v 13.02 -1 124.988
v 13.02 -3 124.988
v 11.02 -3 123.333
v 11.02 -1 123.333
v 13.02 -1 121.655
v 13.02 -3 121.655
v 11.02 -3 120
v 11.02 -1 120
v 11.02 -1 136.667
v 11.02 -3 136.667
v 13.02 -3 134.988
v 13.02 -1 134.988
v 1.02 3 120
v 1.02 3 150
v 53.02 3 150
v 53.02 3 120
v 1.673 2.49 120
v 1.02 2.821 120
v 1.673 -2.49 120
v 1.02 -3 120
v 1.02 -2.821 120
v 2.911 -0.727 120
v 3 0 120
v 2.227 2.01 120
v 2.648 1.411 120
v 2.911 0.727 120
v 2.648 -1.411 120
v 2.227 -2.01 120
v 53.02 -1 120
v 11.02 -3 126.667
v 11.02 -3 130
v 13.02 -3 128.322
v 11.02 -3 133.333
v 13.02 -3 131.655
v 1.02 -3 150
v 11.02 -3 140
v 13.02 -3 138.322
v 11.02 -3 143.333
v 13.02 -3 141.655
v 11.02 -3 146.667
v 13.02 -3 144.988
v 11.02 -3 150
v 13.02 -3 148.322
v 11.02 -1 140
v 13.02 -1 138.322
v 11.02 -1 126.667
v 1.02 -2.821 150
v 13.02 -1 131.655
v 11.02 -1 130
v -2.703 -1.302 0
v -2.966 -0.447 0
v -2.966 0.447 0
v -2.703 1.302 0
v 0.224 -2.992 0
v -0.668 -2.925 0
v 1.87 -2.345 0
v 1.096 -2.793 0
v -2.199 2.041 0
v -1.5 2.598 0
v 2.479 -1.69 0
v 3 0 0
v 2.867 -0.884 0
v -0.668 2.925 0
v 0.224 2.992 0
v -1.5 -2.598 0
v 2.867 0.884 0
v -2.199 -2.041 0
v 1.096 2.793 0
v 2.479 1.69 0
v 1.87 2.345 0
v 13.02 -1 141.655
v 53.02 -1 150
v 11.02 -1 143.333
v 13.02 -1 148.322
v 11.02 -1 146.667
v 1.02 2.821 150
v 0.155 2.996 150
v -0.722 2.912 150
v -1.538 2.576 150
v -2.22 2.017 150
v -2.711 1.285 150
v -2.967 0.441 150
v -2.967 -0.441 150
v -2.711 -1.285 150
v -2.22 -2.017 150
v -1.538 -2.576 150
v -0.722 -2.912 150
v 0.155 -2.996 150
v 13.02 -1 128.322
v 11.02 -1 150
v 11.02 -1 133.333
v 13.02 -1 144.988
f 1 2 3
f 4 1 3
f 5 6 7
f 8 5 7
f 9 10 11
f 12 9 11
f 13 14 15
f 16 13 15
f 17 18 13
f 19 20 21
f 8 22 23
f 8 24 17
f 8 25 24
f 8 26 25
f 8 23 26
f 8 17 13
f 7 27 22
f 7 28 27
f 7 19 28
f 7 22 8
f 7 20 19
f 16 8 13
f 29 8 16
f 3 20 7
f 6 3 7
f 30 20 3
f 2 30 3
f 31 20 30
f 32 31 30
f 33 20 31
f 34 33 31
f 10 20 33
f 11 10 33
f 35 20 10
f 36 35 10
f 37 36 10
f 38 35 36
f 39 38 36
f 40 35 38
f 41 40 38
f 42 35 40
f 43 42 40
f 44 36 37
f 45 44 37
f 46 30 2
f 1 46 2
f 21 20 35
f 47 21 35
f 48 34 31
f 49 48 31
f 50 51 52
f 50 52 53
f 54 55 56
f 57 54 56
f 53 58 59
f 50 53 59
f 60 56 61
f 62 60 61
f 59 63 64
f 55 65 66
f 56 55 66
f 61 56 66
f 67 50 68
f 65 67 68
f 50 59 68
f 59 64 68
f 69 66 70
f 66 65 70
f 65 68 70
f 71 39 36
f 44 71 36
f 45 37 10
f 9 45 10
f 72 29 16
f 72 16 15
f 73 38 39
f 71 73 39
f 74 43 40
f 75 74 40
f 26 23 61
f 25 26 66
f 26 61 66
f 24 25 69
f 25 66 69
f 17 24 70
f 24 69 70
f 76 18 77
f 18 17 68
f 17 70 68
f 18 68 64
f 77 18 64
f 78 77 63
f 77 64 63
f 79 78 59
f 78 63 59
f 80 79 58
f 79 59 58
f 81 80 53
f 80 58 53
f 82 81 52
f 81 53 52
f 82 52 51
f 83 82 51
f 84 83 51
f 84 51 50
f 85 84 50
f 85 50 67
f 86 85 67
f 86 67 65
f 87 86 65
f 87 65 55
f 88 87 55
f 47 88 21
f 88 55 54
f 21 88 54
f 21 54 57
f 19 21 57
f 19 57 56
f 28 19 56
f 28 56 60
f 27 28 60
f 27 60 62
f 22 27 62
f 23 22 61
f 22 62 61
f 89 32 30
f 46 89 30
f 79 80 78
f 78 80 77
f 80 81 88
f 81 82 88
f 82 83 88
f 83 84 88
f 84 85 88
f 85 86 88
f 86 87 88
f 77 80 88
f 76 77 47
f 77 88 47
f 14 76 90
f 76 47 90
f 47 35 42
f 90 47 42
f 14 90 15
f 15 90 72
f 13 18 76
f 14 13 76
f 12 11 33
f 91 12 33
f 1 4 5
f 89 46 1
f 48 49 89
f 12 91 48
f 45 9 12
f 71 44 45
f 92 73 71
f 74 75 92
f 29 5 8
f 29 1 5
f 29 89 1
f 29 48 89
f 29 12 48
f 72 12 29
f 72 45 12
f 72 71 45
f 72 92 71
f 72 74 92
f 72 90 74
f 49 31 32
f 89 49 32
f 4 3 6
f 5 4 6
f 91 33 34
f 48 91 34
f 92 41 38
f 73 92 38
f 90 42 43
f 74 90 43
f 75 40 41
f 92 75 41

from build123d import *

# Parameters (mm, degrees)
F0_R     = 3
F1_DEPTH = 150
F2_W     = 52
F2_H     = 30
F3_DEPTH = 3
F5_DEPTH = 2


with BuildPart() as f1:
    # F0 (on Top) → F1 (new body)
    with BuildSketch(Plane.XY):
        Circle(F0_R)
    extrude(amount=F1_DEPTH)

    # F2 (on Front) → F3 (join, symmetric)
    with BuildSketch(Plane.XZ):
        with Locations((27.0199, 135)):
            Rectangle(F2_W, F2_H)
    extrude(amount=F3_DEPTH, both=True)

    # F4 (on face) → F5 (cut)
    with BuildSketch(Plane.XZ.offset(3)):
        Polygon((11.0199, 120), (53.0199, 120), (53.0199, 150), (11.0199, 150), (13.0199, 148.321801), (11.0199, 146.666667), (13.0199, 144.988467), (11.0199, 143.333333), (13.0199, 141.655134), (11.0199, 140), (13.0199, 138.321801), (11.0199, 136.666667), (13.0199, 134.988467), (11.0199, 133.333333), (13.0199, 131.655134), (11.0199, 130), (13.0199, 128.321801), (11.0199, 126.666667), (13.0199, 124.988467), (11.0199, 123.333333), (13.0199, 121.655134), align=None)
    extrude(amount=-F5_DEPTH, mode=Mode.SUBTRACT)


solid = f1.part
